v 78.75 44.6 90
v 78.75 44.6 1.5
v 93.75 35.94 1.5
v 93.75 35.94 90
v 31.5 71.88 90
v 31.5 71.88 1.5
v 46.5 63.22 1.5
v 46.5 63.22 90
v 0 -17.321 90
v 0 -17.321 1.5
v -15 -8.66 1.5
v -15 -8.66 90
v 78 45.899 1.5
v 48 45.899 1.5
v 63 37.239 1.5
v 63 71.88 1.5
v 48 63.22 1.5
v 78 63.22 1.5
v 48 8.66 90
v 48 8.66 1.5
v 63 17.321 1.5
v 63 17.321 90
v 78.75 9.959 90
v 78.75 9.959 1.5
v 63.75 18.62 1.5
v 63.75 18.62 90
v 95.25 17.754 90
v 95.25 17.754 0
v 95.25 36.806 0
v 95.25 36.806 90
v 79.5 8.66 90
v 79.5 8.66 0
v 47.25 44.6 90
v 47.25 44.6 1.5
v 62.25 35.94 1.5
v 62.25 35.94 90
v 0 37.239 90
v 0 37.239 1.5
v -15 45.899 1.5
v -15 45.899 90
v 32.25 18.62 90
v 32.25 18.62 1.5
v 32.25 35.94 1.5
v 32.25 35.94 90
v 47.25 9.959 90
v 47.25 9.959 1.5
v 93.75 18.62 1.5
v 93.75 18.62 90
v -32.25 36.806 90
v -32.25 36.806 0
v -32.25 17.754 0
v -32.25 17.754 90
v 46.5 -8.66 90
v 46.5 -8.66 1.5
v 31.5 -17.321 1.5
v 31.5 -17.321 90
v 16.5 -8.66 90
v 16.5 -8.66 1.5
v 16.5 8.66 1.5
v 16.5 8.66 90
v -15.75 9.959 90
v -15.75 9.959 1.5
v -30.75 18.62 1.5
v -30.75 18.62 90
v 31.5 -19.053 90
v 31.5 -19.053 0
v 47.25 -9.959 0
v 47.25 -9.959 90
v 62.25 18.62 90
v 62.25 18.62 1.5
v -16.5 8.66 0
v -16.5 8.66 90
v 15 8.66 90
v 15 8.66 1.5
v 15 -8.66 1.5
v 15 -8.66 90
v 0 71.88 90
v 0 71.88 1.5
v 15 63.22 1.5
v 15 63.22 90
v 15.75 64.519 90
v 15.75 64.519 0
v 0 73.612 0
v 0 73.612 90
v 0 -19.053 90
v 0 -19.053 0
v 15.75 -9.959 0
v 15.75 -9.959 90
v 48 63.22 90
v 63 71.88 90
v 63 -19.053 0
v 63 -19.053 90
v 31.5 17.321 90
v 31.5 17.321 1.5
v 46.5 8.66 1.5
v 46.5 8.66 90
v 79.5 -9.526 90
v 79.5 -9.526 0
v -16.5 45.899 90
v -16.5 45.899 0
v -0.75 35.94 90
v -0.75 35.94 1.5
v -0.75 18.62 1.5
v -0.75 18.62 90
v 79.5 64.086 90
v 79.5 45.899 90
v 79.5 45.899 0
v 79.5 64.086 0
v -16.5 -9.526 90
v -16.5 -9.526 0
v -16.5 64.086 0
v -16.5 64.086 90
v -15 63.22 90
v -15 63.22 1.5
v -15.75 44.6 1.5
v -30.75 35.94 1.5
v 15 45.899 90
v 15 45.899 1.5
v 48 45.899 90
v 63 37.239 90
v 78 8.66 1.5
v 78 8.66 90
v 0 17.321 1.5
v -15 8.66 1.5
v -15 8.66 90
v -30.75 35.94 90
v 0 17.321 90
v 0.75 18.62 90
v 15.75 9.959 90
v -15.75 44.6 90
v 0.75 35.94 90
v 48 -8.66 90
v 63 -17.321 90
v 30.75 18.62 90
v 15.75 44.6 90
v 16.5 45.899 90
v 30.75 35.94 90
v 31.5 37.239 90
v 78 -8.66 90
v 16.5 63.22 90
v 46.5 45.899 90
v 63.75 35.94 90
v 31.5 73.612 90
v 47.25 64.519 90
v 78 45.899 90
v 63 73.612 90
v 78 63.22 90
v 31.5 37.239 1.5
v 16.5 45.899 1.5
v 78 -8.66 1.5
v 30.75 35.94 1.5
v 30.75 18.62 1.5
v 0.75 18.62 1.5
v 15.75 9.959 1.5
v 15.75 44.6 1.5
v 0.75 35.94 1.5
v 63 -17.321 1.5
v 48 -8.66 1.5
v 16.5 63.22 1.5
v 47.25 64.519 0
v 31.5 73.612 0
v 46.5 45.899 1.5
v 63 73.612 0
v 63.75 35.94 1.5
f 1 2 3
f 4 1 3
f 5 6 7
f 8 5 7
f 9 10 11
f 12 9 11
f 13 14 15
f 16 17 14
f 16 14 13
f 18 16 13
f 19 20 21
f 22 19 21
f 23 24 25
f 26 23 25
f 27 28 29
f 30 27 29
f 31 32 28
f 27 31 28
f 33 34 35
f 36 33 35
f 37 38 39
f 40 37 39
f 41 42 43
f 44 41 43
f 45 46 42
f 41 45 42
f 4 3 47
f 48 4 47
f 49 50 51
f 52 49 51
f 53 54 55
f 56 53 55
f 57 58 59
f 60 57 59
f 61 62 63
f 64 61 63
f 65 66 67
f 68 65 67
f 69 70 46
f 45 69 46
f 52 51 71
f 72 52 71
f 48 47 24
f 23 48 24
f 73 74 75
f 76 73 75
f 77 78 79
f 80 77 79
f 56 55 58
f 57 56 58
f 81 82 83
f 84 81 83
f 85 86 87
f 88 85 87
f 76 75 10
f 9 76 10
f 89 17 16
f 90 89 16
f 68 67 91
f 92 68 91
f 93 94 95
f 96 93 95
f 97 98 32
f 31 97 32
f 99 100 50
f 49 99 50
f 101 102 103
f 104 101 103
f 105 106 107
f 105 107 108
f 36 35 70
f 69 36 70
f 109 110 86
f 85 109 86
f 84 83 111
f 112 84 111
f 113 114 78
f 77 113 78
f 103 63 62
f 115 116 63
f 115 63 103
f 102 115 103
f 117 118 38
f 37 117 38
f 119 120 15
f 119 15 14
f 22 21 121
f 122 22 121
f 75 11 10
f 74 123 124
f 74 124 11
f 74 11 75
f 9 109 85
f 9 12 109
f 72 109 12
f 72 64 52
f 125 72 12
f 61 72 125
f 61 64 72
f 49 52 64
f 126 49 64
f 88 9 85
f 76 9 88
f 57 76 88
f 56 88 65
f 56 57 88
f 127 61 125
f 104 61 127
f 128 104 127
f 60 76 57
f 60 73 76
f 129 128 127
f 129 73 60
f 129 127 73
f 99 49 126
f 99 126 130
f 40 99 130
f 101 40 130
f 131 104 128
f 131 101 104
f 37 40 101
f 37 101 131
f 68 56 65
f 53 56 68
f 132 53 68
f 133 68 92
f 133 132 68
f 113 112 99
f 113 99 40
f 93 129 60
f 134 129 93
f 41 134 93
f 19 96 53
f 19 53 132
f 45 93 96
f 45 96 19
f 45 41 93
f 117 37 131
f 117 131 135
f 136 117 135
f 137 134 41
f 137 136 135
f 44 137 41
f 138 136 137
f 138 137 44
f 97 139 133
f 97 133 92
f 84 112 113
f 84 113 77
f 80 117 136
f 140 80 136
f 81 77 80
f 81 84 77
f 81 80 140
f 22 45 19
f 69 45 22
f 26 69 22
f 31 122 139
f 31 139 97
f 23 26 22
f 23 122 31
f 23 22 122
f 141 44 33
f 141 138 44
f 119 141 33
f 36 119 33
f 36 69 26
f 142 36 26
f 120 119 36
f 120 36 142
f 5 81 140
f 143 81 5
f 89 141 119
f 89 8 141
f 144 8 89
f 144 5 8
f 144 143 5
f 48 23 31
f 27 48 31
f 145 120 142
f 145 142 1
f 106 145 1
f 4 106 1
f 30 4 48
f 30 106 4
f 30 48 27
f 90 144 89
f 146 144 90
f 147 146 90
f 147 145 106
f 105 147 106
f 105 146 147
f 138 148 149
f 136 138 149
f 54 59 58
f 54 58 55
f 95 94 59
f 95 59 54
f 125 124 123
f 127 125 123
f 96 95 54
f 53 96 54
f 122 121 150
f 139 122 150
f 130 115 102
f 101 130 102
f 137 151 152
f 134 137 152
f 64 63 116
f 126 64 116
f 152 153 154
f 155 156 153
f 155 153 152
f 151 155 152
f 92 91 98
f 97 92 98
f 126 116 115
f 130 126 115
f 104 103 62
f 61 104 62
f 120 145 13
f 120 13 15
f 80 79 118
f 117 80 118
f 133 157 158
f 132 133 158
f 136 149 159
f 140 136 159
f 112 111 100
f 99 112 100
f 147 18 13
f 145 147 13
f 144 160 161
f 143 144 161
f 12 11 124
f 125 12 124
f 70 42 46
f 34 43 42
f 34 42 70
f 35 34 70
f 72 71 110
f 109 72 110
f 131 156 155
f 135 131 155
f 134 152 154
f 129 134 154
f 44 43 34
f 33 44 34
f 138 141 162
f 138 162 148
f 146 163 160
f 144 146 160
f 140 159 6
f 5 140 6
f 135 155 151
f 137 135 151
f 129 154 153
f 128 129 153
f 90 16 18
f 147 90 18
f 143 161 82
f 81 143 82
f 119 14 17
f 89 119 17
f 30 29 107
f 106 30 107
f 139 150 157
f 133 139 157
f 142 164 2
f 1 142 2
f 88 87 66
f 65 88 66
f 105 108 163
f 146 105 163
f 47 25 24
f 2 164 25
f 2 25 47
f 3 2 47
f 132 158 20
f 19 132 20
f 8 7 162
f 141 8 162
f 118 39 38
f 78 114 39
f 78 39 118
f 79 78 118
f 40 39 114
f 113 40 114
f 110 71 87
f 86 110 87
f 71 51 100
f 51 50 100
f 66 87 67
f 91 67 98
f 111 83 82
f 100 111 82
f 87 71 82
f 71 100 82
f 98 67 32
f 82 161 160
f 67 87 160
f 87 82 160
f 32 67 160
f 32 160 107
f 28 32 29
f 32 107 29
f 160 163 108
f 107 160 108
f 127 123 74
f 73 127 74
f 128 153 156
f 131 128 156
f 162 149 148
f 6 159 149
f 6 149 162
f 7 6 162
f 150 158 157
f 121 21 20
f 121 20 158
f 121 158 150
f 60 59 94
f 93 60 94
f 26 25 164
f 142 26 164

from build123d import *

# Parameters (mm, degrees)
F3_DEPTH = 90
F4_DEPTH = 1.5


with BuildPart() as f3:
    # F1 (on Top) → F3 (new body)
    with BuildSketch(Plane.XY):
        Polygon((0.75, 17.7535207776), (0, 17.3205080757), (15, 8.6602540378), (15, 9.5262794416), (15.75, 9.9592921435), (0.75, 18.6195461814), align=None)
        Polygon((-0.75, 17.7535207776), (0, 17.3205080757), (0.75, 17.7535207776), (0.75, 18.6195461814), (0, 19.0525588833), (-0.75, 18.6195461814), align=None)
        Polygon((-15, 8.6602540378), (0, 17.3205080757), (-0.75, 17.7535207776), (-0.75, 18.6195461814), (-15.75, 9.9592921435), (-16.5, 9.5262794416), (-16.5, 8.6602540378), (-15.75, 8.227241336), align=None)
        Polygon((15.75, 8.227241336), (15, 8.6602540378), (15, -8.6602540378), (15, -9.5262794416), (15.75, -9.9592921435), (16.5, -9.5262794416), (16.5, -8.6602540378), (16.5, 8.6602540378), align=None)
        Polygon((15, 9.5262794416), (15, 8.6602540378), (15.75, 8.227241336), (16.5, 8.6602540378), (16.5, 9.5262794416), (15.75, 9.9592921435), align=None)
        Polygon((-15, -8.6602540378), (-15, 8.6602540378), (-15.75, 8.227241336), (-16.5, 8.6602540378), (-16.5, -9.5262794416), (0, -19.0525588833), (15.75, -9.9592921435), (15, -9.5262794416), (15, -8.6602540378), (0, -17.3205080757), align=None)
        Polygon((0, 19.0525588833), (0.75, 18.6195461814), (0.75, 35.9400542571), (0, 35.5070415552), (-0.75, 35.9400542571), (-0.75, 18.6195461814), align=None)
        Polygon((30.75, 18.6195461814), (15.75, 9.9592921435), (16.5, 9.5262794416), (16.5, 8.6602540378), (31.5, 17.3205080757), (30.75, 17.7535207776), align=None)
        Polygon((-32.25, 17.7535207776), (-16.5, 8.6602540378), (-16.5, 9.5262794416), (-15.75, 9.9592921435), (-30.75, 18.6195461814), (-30.75, 35.9400542571), (-15.75, 44.6003082949), (-16.5, 45.0333209968), (-16.5, 45.8993464006), (-32.25, 36.8060796608), align=None)
        Polygon((0, 35.5070415552), (0.75, 35.9400542571), (0.75, 36.8060796608), (0, 37.2390923627), (-0.75, 36.8060796608), (-0.75, 35.9400542571), align=None)
        Polygon((0.75, 36.8060796608), (0.75, 35.9400542571), (15.75, 44.6003082949), (15, 45.0333209968), (15, 45.8993464006), (0, 37.2390923627), align=None)
        Polygon((-15.75, 44.6003082949), (-0.75, 35.9400542571), (-0.75, 36.8060796608), (0, 37.2390923627), (-15, 45.8993464006), (-15.75, 46.3323591025), (-16.5, 45.8993464006), (-16.5, 45.0333209968), align=None)
        Polygon((16.5, -9.5262794416), (15.75, -9.9592921435), (31.5, -19.0525588833), (47.25, -9.9592921435), (46.5, -9.5262794416), (46.5, -8.6602540378), (31.5, -17.3205080757), (16.5, -8.6602540378), align=None)
        Polygon((30.75, 35.9400542571), (30.75, 18.6195461814), (31.5, 19.0525588833), (32.25, 18.6195461814), (32.25, 35.9400542571), (31.5, 35.5070415552), align=None)
        Polygon((31.5, 19.0525588833), (30.75, 18.6195461814), (30.75, 17.7535207776), (31.5, 17.3205080757), (32.25, 17.7535207776), (32.25, 18.6195461814), align=None)
        Polygon((32.25, 17.7535207776), (31.5, 17.3205080757), (46.5, 8.6602540378), (46.5, 9.5262794416), (47.25, 9.9592921435), (32.25, 18.6195461814), align=None)
        Polygon((16.5, 45.0333209968), (15.75, 44.6003082949), (30.75, 35.9400542571), (30.75, 36.8060796608), (31.5, 37.2390923627), (16.5, 45.8993464006), align=None)
        Polygon((15, 45.0333209968), (15.75, 44.6003082949), (16.5, 45.0333209968), (16.5, 45.8993464006), (15.75, 46.3323591025), (15, 45.8993464006), align=None)
        Polygon((30.75, 36.8060796608), (30.75, 35.9400542571), (31.5, 35.5070415552), (32.25, 35.9400542571), (32.25, 36.8060796608), (31.5, 37.2390923627), align=None)
        Polygon((47.25, 8.227241336), (46.5, 8.6602540378), (46.5, -8.6602540378), (46.5, -9.5262794416), (47.25, -9.9592921435), (48, -9.5262794416), (48, -8.6602540378), (48, 8.6602540378), align=None)
        Polygon((46.5, 9.5262794416), (46.5, 8.6602540378), (47.25, 8.227241336), (48, 8.6602540378), (48, 9.5262794416), (47.25, 9.9592921435), align=None)
        Polygon((48, -9.5262794416), (47.25, -9.9592921435), (63, -19.0525588833), (79.5, -9.5262794416), (79.5, 8.6602540378), (78.75, 8.227241336), (78, 8.6602540378), (78, -8.6602540378), (63, -17.3205080757), (48, -8.6602540378), align=None)
        Polygon((-16.5, 64.08587988), (-16.5, 45.8993464006), (-15.75, 46.3323591025), (-15, 45.8993464006), (-15, 63.2198544763), (0, 71.8801085141), (15, 63.2198544763), (15, 64.08587988), (15.75, 64.5188925819), (0, 73.6121593217), align=None)
        Polygon((15, 63.2198544763), (15, 45.8993464006), (15.75, 46.3323591025), (16.5, 45.8993464006), (16.5, 63.2198544763), (16.5, 64.08587988), (15.75, 64.5188925819), (15, 64.08587988), align=None)
        Polygon((62.25, 18.6195461814), (47.25, 9.9592921435), (48, 9.5262794416), (48, 8.6602540378), (63, 17.3205080757), (62.25, 17.7535207776), align=None)
        Polygon((32.25, 36.8060796608), (32.25, 35.9400542571), (47.25, 44.6003082949), (46.5, 45.0333209968), (46.5, 45.8993464006), (31.5, 37.2390923627), align=None)
        Polygon((16.5, 64.08587988), (16.5, 63.2198544763), (31.5, 71.8801085141), (46.5, 63.2198544763), (46.5, 64.08587988), (47.25, 64.5188925819), (31.5, 73.6121593217), (15.75, 64.5188925819), align=None)
        Polygon((62.25, 35.9400542571), (62.25, 18.6195461814), (63, 19.0525588833), (63.75, 18.6195461814), (63.75, 35.9400542571), (63, 35.5070415552), align=None)
        Polygon((63, 19.0525588833), (62.25, 18.6195461814), (62.25, 17.7535207776), (63, 17.3205080757), (63.75, 17.7535207776), (63.75, 18.6195461814), align=None)
        Polygon((48, 45.0333209968), (47.25, 44.6003082949), (62.25, 35.9400542571), (62.25, 36.8060796608), (63, 37.2390923627), (48, 45.8993464006), align=None)
        Polygon((46.5, 45.0333209968), (47.25, 44.6003082949), (48, 45.0333209968), (48, 45.8993464006), (47.25, 46.3323591025), (46.5, 45.8993464006), align=None)
        Polygon((46.5, 63.2198544763), (46.5, 45.8993464006), (47.25, 46.3323591025), (48, 45.8993464006), (48, 63.2198544763), (48, 64.08587988), (47.25, 64.5188925819), (46.5, 64.08587988), align=None)
        Polygon((63.75, 17.7535207776), (63, 17.3205080757), (78, 8.6602540378), (78.75, 8.227241336), (79.5, 8.6602540378), (79.5, 9.5262794416), (78.75, 9.9592921435), (63.75, 18.6195461814), align=None)
        Polygon((79.5, 9.5262794416), (79.5, 8.6602540378), (95.25, 17.7535207776), (95.25, 36.8060796608), (79.5, 45.8993464006), (79.5, 45.0333209968), (78.75, 44.6003082949), (93.75, 35.9400542571), (93.75, 18.6195461814), (78.75, 9.9592921435), align=None)
        Polygon((62.25, 36.8060796608), (62.25, 35.9400542571), (63, 35.5070415552), (63.75, 35.9400542571), (63.75, 36.8060796608), (63, 37.2390923627), align=None)
        Polygon((63.75, 36.8060796608), (63.75, 35.9400542571), (78.75, 44.6003082949), (79.5, 45.0333209968), (79.5, 45.8993464006), (78.75, 46.3323591025), (78, 45.8993464006), (63, 37.2390923627), align=None)
        Polygon((48, 64.08587988), (48, 63.2198544763), (63, 71.8801085141), (78, 63.2198544763), (78, 45.8993464006), (78.75, 46.3323591025), (79.5, 45.8993464006), (79.5, 64.08587988), (63, 73.6121593217), (47.25, 64.5188925819), align=None)
    extrude(amount=F3_DEPTH)

    # F1 (on Top) → F4 (join)
    with BuildSketch(Plane.XY):
        Polygon((0, 19.0525588833), (0.75, 18.6195461814), (0.75, 35.9400542571), (0, 35.5070415552), (-0.75, 35.9400542571), (-0.75, 18.6195461814), align=None)
        Polygon((30.75, 35.9400542571), (30.75, 18.6195461814), (31.5, 19.0525588833), (32.25, 18.6195461814), (32.25, 35.9400542571), (31.5, 35.5070415552), align=None)
        Polygon((16.5, 63.2198544763), (16.5, 45.8993464006), (31.5, 37.2390923627), (46.5, 45.8993464006), (46.5, 63.2198544763), (31.5, 71.8801085141), align=None)
        Polygon((-15.75, 9.9592921435), (-0.75, 18.6195461814), (-0.75, 35.9400542571), (-15.75, 44.6003082949), (-30.75, 35.9400542571), (-30.75, 18.6195461814), align=None)
        Polygon((-15, 45.8993464006), (0, 37.2390923627), (15, 45.8993464006), (15, 63.2198544763), (0, 71.8801085141), (-15, 63.2198544763), align=None)
        Polygon((15, 8.6602540378), (0, 17.3205080757), (-15, 8.6602540378), (-15, -8.6602540378), (0, -17.3205080757), (15, -8.6602540378), align=None)
        Polygon((63.75, 36.8060796608), (63.75, 35.9400542571), (78.75, 44.6003082949), (79.5, 45.0333209968), (79.5, 45.8993464006), (78.75, 46.3323591025), (78, 45.8993464006), (63, 37.2390923627), align=None)
        Polygon((31.5, 17.3205080757), (16.5, 8.6602540378), (16.5, -8.6602540378), (31.5, -17.3205080757), (46.5, -8.6602540378), (46.5, 8.6602540378), align=None)
        Polygon((63, 17.3205080757), (48, 8.6602540378), (48, -8.6602540378), (63, -17.3205080757), (78, -8.6602540378), (78, 8.6602540378), align=None)
        Polygon((63.75, 35.9400542571), (63.75, 18.6195461814), (78.75, 9.9592921435), (93.75, 18.6195461814), (93.75, 35.9400542571), (78.75, 44.6003082949), align=None)
        Polygon((48, 64.08587988), (48, 63.2198544763), (63, 71.8801085141), (78, 63.2198544763), (78, 45.8993464006), (78.75, 46.3323591025), (79.5, 45.8993464006), (79.5, 64.08587988), (63, 73.6121593217), (47.25, 64.5188925819), align=None)
        Polygon((16.5, 64.08587988), (16.5, 63.2198544763), (31.5, 71.8801085141), (46.5, 63.2198544763), (46.5, 64.08587988), (47.25, 64.5188925819), (31.5, 73.6121593217), (15.75, 64.5188925819), align=None)
        Polygon((-15, -8.6602540378), (-15, 8.6602540378), (-15.75, 8.227241336), (-16.5, 8.6602540378), (-16.5, -9.5262794416), (0, -19.0525588833), (15.75, -9.9592921435), (15, -9.5262794416), (15, -8.6602540378), (0, -17.3205080757), align=None)
        Polygon((-32.25, 17.7535207776), (-16.5, 8.6602540378), (-16.5, 9.5262794416), (-15.75, 9.9592921435), (-30.75, 18.6195461814), (-30.75, 35.9400542571), (-15.75, 44.6003082949), (-16.5, 45.0333209968), (-16.5, 45.8993464006), (-32.25, 36.8060796608), align=None)
        Polygon((16.5, -9.5262794416), (15.75, -9.9592921435), (31.5, -19.0525588833), (47.25, -9.9592921435), (46.5, -9.5262794416), (46.5, -8.6602540378), (31.5, -17.3205080757), (16.5, -8.6602540378), align=None)
        Polygon((48, -9.5262794416), (47.25, -9.9592921435), (63, -19.0525588833), (79.5, -9.5262794416), (79.5, 8.6602540378), (78.75, 8.227241336), (78, 8.6602540378), (78, -8.6602540378), (63, -17.3205080757), (48, -8.6602540378), align=None)
        Polygon((79.5, 9.5262794416), (79.5, 8.6602540378), (95.25, 17.7535207776), (95.25, 36.8060796608), (79.5, 45.8993464006), (79.5, 45.0333209968), (78.75, 44.6003082949), (93.75, 35.9400542571), (93.75, 18.6195461814), (78.75, 9.9592921435), align=None)
        Polygon((-16.5, 64.08587988), (-16.5, 45.8993464006), (-15.75, 46.3323591025), (-15, 45.8993464006), (-15, 63.2198544763), (0, 71.8801085141), (15, 63.2198544763), (15, 64.08587988), (15.75, 64.5188925819), (0, 73.6121593217), align=None)
        Polygon((48, 63.2198544763), (48, 45.8993464006), (63, 37.2390923627), (78, 45.8993464006), (78, 63.2198544763), (63, 71.8801085141), align=None)
        Polygon((0.75, 35.9400542571), (0.75, 18.6195461814), (15.75, 9.9592921435), (30.75, 18.6195461814), (30.75, 35.9400542571), (15.75, 44.6003082949), align=None)
        Polygon((32.25, 35.9400542571), (32.25, 18.6195461814), (47.25, 9.9592921435), (62.25, 18.6195461814), (62.25, 35.9400542571), (47.25, 44.6003082949), align=None)
        Polygon((46.5, 45.0333209968), (47.25, 44.6003082949), (48, 45.0333209968), (48, 45.8993464006), (47.25, 46.3323591025), (46.5, 45.8993464006), align=None)
        Polygon((15, 45.0333209968), (15.75, 44.6003082949), (16.5, 45.0333209968), (16.5, 45.8993464006), (15.75, 46.3323591025), (15, 45.8993464006), align=None)
        Polygon((62.25, 36.8060796608), (62.25, 35.9400542571), (63, 35.5070415552), (63.75, 35.9400542571), (63.75, 36.8060796608), (63, 37.2390923627), align=None)
        Polygon((-0.75, 17.7535207776), (0, 17.3205080757), (0.75, 17.7535207776), (0.75, 18.6195461814), (0, 19.0525588833), (-0.75, 18.6195461814), align=None)
        Polygon((15, 9.5262794416), (15, 8.6602540378), (15.75, 8.227241336), (16.5, 8.6602540378), (16.5, 9.5262794416), (15.75, 9.9592921435), align=None)
        Polygon((31.5, 19.0525588833), (30.75, 18.6195461814), (30.75, 17.7535207776), (31.5, 17.3205080757), (32.25, 17.7535207776), (32.25, 18.6195461814), align=None)
        Polygon((46.5, 9.5262794416), (46.5, 8.6602540378), (47.25, 8.227241336), (48, 8.6602540378), (48, 9.5262794416), (47.25, 9.9592921435), align=None)
        Polygon((63, 19.0525588833), (62.25, 18.6195461814), (62.25, 17.7535207776), (63, 17.3205080757), (63.75, 17.7535207776), (63.75, 18.6195461814), align=None)
        Polygon((0, 35.5070415552), (0.75, 35.9400542571), (0.75, 36.8060796608), (0, 37.2390923627), (-0.75, 36.8060796608), (-0.75, 35.9400542571), align=None)
        Polygon((30.75, 36.8060796608), (30.75, 35.9400542571), (31.5, 35.5070415552), (32.25, 35.9400542571), (32.25, 36.8060796608), (31.5, 37.2390923627), align=None)
    extrude(amount=F4_DEPTH)


solid = f3.part
